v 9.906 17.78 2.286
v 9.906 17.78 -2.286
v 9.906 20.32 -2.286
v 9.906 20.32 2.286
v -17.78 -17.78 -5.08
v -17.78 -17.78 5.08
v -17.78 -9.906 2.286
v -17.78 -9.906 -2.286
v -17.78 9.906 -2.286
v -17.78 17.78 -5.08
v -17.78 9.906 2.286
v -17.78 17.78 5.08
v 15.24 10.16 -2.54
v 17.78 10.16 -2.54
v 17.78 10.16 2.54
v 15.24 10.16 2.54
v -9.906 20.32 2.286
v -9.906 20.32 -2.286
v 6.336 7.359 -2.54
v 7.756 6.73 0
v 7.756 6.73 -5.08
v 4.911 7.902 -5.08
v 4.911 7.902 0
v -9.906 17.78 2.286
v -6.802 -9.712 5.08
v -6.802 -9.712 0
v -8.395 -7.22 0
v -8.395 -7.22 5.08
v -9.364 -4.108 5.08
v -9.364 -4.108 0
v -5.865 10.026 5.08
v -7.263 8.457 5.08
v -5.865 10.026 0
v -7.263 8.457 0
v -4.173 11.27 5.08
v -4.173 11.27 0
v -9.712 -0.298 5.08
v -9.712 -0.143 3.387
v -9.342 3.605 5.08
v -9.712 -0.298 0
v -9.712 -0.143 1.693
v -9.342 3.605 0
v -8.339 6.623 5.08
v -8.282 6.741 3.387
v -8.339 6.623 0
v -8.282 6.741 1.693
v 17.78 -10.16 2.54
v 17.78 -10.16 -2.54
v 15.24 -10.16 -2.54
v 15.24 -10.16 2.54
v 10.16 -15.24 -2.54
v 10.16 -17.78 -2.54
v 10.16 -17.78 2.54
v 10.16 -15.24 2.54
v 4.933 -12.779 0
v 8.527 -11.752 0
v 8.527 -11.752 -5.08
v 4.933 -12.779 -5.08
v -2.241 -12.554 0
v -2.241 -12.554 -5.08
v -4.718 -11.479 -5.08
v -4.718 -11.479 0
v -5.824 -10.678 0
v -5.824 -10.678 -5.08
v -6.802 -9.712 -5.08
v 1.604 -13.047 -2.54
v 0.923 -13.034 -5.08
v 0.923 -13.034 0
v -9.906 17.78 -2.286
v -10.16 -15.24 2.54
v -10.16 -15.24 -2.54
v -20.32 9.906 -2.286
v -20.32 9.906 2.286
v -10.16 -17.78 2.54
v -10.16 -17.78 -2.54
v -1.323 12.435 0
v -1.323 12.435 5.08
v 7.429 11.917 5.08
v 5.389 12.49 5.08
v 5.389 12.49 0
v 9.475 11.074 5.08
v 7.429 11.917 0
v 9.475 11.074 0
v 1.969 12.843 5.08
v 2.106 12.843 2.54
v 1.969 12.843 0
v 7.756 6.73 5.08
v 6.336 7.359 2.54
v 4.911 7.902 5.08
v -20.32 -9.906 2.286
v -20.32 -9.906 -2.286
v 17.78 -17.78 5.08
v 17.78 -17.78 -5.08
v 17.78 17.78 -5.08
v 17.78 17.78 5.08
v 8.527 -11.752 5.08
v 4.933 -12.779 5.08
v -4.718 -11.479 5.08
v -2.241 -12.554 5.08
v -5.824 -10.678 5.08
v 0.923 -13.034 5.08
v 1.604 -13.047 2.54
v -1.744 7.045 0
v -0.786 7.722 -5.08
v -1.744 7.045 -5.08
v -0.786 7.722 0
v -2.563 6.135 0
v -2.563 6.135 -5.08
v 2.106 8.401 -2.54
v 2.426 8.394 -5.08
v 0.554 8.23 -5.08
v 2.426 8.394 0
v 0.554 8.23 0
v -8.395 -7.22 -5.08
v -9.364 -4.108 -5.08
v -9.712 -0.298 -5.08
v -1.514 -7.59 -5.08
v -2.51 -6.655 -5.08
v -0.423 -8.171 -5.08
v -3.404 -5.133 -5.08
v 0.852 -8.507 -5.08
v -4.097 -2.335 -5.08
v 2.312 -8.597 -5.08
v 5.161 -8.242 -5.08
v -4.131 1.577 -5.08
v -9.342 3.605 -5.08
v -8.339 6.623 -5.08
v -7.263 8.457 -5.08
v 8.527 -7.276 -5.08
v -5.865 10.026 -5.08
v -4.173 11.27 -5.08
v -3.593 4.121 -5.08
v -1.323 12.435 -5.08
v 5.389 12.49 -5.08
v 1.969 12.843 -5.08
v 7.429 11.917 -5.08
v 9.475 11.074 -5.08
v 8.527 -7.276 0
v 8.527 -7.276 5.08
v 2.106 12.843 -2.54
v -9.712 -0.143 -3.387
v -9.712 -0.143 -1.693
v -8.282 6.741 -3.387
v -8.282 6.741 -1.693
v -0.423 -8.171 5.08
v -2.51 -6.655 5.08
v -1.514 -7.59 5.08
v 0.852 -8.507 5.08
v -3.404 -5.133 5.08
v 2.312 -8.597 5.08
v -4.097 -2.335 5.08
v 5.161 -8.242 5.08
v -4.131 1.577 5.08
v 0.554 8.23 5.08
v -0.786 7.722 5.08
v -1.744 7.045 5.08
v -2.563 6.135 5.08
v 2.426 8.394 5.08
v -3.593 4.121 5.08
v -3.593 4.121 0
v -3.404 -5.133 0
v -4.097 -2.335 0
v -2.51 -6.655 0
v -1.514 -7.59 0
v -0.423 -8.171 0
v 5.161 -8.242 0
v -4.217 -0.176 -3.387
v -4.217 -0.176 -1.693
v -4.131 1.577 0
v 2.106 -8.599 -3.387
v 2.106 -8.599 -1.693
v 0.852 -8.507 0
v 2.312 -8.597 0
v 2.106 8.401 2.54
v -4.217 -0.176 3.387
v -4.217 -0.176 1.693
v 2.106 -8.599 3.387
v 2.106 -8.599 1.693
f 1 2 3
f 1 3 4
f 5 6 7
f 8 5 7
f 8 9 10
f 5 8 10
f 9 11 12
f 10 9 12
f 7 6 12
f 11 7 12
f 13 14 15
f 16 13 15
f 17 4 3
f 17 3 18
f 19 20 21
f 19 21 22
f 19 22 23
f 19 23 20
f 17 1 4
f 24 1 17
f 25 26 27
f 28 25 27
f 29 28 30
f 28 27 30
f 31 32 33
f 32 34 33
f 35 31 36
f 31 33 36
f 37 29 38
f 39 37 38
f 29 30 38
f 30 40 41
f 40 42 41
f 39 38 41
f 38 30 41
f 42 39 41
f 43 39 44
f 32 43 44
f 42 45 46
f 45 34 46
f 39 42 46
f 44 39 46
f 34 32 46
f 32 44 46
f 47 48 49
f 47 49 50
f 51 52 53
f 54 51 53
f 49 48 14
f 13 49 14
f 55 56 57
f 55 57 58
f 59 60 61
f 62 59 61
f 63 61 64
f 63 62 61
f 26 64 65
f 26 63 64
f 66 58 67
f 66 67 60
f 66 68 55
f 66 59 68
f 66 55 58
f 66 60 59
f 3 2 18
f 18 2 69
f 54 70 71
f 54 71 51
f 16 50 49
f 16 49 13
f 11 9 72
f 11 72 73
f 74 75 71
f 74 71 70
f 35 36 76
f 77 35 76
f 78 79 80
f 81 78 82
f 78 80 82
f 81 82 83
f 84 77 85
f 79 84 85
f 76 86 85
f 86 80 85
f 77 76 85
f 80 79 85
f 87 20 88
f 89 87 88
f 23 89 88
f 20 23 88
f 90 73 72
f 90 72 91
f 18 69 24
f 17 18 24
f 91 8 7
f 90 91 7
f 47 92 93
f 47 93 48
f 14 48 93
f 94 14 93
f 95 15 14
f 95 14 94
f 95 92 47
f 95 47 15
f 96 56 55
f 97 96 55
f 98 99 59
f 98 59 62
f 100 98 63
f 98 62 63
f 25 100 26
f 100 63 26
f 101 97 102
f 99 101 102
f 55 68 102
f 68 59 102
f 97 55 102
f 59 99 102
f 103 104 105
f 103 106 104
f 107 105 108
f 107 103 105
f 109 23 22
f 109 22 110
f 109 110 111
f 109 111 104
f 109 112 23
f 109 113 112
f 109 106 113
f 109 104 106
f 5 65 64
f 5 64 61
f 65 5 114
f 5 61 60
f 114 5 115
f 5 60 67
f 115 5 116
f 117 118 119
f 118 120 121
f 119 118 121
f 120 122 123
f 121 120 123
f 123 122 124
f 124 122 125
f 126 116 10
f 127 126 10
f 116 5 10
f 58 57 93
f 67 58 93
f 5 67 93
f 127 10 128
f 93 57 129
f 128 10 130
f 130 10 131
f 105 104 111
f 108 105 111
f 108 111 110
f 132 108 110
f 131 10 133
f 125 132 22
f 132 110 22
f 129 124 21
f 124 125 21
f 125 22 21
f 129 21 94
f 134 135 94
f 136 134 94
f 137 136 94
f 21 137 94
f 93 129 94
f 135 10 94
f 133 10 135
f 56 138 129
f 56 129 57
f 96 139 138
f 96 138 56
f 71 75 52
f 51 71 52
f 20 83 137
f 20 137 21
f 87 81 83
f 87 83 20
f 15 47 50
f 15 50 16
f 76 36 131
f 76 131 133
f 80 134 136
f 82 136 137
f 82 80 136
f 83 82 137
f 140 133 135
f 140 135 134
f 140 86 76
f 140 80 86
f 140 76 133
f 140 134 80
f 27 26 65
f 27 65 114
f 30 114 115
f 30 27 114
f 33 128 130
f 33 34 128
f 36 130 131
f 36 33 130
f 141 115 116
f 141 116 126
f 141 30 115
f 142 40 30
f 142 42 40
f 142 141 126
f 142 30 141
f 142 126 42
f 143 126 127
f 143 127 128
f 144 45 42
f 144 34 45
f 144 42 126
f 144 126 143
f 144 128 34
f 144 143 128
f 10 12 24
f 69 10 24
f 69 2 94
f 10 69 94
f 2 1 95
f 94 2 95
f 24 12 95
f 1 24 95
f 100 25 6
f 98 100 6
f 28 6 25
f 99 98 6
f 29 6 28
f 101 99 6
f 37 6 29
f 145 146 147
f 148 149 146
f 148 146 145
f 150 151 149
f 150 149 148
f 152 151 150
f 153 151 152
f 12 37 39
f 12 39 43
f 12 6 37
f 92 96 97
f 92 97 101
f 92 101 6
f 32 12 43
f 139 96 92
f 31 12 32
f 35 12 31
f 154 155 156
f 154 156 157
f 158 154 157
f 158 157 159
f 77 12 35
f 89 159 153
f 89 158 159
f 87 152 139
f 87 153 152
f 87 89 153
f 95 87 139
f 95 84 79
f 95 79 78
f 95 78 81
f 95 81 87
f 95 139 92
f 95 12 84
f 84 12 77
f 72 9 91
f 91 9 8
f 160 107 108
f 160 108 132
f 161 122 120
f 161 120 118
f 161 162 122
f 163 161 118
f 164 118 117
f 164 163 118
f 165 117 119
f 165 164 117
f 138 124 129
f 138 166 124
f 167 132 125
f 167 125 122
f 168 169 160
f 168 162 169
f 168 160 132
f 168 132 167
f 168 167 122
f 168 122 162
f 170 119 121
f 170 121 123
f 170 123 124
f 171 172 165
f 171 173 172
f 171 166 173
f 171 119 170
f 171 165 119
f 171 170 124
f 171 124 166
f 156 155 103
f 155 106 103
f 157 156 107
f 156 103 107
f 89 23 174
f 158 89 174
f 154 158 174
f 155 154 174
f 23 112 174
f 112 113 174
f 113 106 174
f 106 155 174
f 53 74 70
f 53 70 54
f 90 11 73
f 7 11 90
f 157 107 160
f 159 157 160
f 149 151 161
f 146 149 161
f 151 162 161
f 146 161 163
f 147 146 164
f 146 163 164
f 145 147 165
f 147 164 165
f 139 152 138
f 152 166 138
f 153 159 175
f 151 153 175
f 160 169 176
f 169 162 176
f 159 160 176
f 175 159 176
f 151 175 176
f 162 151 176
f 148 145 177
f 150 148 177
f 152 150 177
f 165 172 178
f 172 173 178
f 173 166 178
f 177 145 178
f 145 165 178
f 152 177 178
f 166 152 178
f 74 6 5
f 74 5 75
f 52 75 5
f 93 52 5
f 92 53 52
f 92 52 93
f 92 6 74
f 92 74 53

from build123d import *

# Parameters (mm, degrees)
F0_W     = 35.56
F0_H     = 35.56
F1_DEPTH = 5.08
F2_W     = 19.812
F2_H     = 4.572
F3_DEPTH = 2.54
F4_W     = 19.812
F4_H     = 4.572
F5_DEPTH = 2.54
F6_W     = 20.32
F6_H     = 5.08
F7_DEPTH = 2.54
F8_W     = 20.32
F8_H     = 5.08
F9_DEPTH = 2.54


with BuildPart() as f1:
    # F0 (on Top) → F1 (new body, symmetric)
    with BuildSketch(Plane.XY):
        Rectangle(F0_W, F0_H)
        with BuildLine():
            add(Edge.make_bspline(
                [(4.911328125, 7.9016710069), (3.4836805556, 8.4005208333), (2.1056423611, 8.4005208333)],
                knots=[0, 0, 0, 1, 1, 1], degree=2))
            add(Edge.make_bspline(
                [(2.1056423611, 8.4005208333), (-0.9095052083, 8.4005208333), (-2.5631510417, 6.1350260417)],
                knots=[0, 0, 0, 1, 1, 1], degree=2))
            add(Edge.make_bspline(
                [(-2.5631510417, 6.1350260417), (-4.216796875, 3.86953125), (-4.216796875, -0.1763888889)],
                knots=[0, 0, 0, 1, 1, 1], degree=2))
            add(Edge.make_bspline(
                [(-4.216796875, -0.1763888889), (-4.216796875, -8.5989583333), (2.1056423611, -8.5989583333)],
                knots=[0, 0, 0, 1, 1, 1], degree=2))
            add(Edge.make_bspline(
                [(2.1056423611, -8.5989583333), (4.7569878472, -8.5989583333), (8.5273003472, -7.2760416667)],
                knots=[0, 0, 0, 1, 1, 1], degree=2))
            Line((8.5273003472, -7.2760416667), (8.5273003472, -11.7519097222))
            add(Edge.make_bspline(
                [(8.5273003472, -11.7519097222), (5.4294704861, -13.047265625), (1.6040364583, -13.047265625)],
                knots=[0, 0, 0, 1, 1, 1], degree=2))
            add(Edge.make_bspline(
                [(1.6040364583, -13.047265625), (-3.8915798611, -13.047265625), (-6.8019965278, -9.7124131944)],
                knots=[0, 0, 0, 1, 1, 1], degree=2))
            add(Edge.make_bspline(
                [(-6.8019965278, -9.7124131944), (-9.7124131944, -6.3775607639), (-9.7124131944, -0.1433159722)],
                knots=[0, 0, 0, 1, 1, 1], degree=2))
            add(Edge.make_bspline(
                [(-9.7124131944, -0.1433159722), (-9.7124131944, 3.7868489583), (-8.2820095486, 6.7413628472)],
                knots=[0, 0, 0, 1, 1, 1], degree=2))
            add(Edge.make_bspline(
                [(-8.2820095486, 6.7413628472), (-6.8516059028, 9.6958767361), (-4.1726996528, 11.2695963542)],
                knots=[0, 0, 0, 1, 1, 1], degree=2))
            add(Edge.make_bspline(
                [(-4.1726996528, 11.2695963542), (-1.4937934028, 12.8433159722), (2.1056423611, 12.8433159722)],
                knots=[0, 0, 0, 1, 1, 1], degree=2))
            add(Edge.make_bspline(
                [(2.1056423611, 12.8433159722), (5.7712239583, 12.8433159722), (9.475390625, 11.0739149306)],
                knots=[0, 0, 0, 1, 1, 1], degree=2))
            Line((9.475390625, 11.0739149306), (7.7555989583, 6.7303385417))
            add(Edge.make_bspline(
                [(7.7555989583, 6.7303385417), (6.3389756944, 7.4028211806), (4.911328125, 7.9016710069)],
                knots=[0, 0, 0, 1, 1, 1], degree=2))
        make_face(mode=Mode.SUBTRACT)
    extrude(amount=F1_DEPTH, both=True)

    # F2 (on face) → F3 (join)
    with BuildSketch(Plane(origin=(0, 17.78, 0), x_dir=(-1, 0, 0), z_dir=(0, 1, 0))):
        Rectangle(F2_W, F2_H)
    extrude(amount=F3_DEPTH)

    # F4 (on face) → F5 (join)
    with BuildSketch(Plane(origin=(-17.78, 0, 0), x_dir=(0, -1, 0), z_dir=(-1, 0, 0))):
        Rectangle(F4_W, F4_H)
    extrude(amount=F5_DEPTH)

    # F6 (on face) → F7 (cut)
    with BuildSketch(Plane.XZ.offset(17.78)):
        Rectangle(F6_W, F6_H)
    extrude(amount=-F7_DEPTH, mode=Mode.SUBTRACT)

    # F8 (on face) → F9 (cut)
    with BuildSketch(Plane.YZ.offset(17.78)):
        Rectangle(F8_W, F8_H)
    extrude(amount=-F9_DEPTH, mode=Mode.SUBTRACT)


solid = f1.part
